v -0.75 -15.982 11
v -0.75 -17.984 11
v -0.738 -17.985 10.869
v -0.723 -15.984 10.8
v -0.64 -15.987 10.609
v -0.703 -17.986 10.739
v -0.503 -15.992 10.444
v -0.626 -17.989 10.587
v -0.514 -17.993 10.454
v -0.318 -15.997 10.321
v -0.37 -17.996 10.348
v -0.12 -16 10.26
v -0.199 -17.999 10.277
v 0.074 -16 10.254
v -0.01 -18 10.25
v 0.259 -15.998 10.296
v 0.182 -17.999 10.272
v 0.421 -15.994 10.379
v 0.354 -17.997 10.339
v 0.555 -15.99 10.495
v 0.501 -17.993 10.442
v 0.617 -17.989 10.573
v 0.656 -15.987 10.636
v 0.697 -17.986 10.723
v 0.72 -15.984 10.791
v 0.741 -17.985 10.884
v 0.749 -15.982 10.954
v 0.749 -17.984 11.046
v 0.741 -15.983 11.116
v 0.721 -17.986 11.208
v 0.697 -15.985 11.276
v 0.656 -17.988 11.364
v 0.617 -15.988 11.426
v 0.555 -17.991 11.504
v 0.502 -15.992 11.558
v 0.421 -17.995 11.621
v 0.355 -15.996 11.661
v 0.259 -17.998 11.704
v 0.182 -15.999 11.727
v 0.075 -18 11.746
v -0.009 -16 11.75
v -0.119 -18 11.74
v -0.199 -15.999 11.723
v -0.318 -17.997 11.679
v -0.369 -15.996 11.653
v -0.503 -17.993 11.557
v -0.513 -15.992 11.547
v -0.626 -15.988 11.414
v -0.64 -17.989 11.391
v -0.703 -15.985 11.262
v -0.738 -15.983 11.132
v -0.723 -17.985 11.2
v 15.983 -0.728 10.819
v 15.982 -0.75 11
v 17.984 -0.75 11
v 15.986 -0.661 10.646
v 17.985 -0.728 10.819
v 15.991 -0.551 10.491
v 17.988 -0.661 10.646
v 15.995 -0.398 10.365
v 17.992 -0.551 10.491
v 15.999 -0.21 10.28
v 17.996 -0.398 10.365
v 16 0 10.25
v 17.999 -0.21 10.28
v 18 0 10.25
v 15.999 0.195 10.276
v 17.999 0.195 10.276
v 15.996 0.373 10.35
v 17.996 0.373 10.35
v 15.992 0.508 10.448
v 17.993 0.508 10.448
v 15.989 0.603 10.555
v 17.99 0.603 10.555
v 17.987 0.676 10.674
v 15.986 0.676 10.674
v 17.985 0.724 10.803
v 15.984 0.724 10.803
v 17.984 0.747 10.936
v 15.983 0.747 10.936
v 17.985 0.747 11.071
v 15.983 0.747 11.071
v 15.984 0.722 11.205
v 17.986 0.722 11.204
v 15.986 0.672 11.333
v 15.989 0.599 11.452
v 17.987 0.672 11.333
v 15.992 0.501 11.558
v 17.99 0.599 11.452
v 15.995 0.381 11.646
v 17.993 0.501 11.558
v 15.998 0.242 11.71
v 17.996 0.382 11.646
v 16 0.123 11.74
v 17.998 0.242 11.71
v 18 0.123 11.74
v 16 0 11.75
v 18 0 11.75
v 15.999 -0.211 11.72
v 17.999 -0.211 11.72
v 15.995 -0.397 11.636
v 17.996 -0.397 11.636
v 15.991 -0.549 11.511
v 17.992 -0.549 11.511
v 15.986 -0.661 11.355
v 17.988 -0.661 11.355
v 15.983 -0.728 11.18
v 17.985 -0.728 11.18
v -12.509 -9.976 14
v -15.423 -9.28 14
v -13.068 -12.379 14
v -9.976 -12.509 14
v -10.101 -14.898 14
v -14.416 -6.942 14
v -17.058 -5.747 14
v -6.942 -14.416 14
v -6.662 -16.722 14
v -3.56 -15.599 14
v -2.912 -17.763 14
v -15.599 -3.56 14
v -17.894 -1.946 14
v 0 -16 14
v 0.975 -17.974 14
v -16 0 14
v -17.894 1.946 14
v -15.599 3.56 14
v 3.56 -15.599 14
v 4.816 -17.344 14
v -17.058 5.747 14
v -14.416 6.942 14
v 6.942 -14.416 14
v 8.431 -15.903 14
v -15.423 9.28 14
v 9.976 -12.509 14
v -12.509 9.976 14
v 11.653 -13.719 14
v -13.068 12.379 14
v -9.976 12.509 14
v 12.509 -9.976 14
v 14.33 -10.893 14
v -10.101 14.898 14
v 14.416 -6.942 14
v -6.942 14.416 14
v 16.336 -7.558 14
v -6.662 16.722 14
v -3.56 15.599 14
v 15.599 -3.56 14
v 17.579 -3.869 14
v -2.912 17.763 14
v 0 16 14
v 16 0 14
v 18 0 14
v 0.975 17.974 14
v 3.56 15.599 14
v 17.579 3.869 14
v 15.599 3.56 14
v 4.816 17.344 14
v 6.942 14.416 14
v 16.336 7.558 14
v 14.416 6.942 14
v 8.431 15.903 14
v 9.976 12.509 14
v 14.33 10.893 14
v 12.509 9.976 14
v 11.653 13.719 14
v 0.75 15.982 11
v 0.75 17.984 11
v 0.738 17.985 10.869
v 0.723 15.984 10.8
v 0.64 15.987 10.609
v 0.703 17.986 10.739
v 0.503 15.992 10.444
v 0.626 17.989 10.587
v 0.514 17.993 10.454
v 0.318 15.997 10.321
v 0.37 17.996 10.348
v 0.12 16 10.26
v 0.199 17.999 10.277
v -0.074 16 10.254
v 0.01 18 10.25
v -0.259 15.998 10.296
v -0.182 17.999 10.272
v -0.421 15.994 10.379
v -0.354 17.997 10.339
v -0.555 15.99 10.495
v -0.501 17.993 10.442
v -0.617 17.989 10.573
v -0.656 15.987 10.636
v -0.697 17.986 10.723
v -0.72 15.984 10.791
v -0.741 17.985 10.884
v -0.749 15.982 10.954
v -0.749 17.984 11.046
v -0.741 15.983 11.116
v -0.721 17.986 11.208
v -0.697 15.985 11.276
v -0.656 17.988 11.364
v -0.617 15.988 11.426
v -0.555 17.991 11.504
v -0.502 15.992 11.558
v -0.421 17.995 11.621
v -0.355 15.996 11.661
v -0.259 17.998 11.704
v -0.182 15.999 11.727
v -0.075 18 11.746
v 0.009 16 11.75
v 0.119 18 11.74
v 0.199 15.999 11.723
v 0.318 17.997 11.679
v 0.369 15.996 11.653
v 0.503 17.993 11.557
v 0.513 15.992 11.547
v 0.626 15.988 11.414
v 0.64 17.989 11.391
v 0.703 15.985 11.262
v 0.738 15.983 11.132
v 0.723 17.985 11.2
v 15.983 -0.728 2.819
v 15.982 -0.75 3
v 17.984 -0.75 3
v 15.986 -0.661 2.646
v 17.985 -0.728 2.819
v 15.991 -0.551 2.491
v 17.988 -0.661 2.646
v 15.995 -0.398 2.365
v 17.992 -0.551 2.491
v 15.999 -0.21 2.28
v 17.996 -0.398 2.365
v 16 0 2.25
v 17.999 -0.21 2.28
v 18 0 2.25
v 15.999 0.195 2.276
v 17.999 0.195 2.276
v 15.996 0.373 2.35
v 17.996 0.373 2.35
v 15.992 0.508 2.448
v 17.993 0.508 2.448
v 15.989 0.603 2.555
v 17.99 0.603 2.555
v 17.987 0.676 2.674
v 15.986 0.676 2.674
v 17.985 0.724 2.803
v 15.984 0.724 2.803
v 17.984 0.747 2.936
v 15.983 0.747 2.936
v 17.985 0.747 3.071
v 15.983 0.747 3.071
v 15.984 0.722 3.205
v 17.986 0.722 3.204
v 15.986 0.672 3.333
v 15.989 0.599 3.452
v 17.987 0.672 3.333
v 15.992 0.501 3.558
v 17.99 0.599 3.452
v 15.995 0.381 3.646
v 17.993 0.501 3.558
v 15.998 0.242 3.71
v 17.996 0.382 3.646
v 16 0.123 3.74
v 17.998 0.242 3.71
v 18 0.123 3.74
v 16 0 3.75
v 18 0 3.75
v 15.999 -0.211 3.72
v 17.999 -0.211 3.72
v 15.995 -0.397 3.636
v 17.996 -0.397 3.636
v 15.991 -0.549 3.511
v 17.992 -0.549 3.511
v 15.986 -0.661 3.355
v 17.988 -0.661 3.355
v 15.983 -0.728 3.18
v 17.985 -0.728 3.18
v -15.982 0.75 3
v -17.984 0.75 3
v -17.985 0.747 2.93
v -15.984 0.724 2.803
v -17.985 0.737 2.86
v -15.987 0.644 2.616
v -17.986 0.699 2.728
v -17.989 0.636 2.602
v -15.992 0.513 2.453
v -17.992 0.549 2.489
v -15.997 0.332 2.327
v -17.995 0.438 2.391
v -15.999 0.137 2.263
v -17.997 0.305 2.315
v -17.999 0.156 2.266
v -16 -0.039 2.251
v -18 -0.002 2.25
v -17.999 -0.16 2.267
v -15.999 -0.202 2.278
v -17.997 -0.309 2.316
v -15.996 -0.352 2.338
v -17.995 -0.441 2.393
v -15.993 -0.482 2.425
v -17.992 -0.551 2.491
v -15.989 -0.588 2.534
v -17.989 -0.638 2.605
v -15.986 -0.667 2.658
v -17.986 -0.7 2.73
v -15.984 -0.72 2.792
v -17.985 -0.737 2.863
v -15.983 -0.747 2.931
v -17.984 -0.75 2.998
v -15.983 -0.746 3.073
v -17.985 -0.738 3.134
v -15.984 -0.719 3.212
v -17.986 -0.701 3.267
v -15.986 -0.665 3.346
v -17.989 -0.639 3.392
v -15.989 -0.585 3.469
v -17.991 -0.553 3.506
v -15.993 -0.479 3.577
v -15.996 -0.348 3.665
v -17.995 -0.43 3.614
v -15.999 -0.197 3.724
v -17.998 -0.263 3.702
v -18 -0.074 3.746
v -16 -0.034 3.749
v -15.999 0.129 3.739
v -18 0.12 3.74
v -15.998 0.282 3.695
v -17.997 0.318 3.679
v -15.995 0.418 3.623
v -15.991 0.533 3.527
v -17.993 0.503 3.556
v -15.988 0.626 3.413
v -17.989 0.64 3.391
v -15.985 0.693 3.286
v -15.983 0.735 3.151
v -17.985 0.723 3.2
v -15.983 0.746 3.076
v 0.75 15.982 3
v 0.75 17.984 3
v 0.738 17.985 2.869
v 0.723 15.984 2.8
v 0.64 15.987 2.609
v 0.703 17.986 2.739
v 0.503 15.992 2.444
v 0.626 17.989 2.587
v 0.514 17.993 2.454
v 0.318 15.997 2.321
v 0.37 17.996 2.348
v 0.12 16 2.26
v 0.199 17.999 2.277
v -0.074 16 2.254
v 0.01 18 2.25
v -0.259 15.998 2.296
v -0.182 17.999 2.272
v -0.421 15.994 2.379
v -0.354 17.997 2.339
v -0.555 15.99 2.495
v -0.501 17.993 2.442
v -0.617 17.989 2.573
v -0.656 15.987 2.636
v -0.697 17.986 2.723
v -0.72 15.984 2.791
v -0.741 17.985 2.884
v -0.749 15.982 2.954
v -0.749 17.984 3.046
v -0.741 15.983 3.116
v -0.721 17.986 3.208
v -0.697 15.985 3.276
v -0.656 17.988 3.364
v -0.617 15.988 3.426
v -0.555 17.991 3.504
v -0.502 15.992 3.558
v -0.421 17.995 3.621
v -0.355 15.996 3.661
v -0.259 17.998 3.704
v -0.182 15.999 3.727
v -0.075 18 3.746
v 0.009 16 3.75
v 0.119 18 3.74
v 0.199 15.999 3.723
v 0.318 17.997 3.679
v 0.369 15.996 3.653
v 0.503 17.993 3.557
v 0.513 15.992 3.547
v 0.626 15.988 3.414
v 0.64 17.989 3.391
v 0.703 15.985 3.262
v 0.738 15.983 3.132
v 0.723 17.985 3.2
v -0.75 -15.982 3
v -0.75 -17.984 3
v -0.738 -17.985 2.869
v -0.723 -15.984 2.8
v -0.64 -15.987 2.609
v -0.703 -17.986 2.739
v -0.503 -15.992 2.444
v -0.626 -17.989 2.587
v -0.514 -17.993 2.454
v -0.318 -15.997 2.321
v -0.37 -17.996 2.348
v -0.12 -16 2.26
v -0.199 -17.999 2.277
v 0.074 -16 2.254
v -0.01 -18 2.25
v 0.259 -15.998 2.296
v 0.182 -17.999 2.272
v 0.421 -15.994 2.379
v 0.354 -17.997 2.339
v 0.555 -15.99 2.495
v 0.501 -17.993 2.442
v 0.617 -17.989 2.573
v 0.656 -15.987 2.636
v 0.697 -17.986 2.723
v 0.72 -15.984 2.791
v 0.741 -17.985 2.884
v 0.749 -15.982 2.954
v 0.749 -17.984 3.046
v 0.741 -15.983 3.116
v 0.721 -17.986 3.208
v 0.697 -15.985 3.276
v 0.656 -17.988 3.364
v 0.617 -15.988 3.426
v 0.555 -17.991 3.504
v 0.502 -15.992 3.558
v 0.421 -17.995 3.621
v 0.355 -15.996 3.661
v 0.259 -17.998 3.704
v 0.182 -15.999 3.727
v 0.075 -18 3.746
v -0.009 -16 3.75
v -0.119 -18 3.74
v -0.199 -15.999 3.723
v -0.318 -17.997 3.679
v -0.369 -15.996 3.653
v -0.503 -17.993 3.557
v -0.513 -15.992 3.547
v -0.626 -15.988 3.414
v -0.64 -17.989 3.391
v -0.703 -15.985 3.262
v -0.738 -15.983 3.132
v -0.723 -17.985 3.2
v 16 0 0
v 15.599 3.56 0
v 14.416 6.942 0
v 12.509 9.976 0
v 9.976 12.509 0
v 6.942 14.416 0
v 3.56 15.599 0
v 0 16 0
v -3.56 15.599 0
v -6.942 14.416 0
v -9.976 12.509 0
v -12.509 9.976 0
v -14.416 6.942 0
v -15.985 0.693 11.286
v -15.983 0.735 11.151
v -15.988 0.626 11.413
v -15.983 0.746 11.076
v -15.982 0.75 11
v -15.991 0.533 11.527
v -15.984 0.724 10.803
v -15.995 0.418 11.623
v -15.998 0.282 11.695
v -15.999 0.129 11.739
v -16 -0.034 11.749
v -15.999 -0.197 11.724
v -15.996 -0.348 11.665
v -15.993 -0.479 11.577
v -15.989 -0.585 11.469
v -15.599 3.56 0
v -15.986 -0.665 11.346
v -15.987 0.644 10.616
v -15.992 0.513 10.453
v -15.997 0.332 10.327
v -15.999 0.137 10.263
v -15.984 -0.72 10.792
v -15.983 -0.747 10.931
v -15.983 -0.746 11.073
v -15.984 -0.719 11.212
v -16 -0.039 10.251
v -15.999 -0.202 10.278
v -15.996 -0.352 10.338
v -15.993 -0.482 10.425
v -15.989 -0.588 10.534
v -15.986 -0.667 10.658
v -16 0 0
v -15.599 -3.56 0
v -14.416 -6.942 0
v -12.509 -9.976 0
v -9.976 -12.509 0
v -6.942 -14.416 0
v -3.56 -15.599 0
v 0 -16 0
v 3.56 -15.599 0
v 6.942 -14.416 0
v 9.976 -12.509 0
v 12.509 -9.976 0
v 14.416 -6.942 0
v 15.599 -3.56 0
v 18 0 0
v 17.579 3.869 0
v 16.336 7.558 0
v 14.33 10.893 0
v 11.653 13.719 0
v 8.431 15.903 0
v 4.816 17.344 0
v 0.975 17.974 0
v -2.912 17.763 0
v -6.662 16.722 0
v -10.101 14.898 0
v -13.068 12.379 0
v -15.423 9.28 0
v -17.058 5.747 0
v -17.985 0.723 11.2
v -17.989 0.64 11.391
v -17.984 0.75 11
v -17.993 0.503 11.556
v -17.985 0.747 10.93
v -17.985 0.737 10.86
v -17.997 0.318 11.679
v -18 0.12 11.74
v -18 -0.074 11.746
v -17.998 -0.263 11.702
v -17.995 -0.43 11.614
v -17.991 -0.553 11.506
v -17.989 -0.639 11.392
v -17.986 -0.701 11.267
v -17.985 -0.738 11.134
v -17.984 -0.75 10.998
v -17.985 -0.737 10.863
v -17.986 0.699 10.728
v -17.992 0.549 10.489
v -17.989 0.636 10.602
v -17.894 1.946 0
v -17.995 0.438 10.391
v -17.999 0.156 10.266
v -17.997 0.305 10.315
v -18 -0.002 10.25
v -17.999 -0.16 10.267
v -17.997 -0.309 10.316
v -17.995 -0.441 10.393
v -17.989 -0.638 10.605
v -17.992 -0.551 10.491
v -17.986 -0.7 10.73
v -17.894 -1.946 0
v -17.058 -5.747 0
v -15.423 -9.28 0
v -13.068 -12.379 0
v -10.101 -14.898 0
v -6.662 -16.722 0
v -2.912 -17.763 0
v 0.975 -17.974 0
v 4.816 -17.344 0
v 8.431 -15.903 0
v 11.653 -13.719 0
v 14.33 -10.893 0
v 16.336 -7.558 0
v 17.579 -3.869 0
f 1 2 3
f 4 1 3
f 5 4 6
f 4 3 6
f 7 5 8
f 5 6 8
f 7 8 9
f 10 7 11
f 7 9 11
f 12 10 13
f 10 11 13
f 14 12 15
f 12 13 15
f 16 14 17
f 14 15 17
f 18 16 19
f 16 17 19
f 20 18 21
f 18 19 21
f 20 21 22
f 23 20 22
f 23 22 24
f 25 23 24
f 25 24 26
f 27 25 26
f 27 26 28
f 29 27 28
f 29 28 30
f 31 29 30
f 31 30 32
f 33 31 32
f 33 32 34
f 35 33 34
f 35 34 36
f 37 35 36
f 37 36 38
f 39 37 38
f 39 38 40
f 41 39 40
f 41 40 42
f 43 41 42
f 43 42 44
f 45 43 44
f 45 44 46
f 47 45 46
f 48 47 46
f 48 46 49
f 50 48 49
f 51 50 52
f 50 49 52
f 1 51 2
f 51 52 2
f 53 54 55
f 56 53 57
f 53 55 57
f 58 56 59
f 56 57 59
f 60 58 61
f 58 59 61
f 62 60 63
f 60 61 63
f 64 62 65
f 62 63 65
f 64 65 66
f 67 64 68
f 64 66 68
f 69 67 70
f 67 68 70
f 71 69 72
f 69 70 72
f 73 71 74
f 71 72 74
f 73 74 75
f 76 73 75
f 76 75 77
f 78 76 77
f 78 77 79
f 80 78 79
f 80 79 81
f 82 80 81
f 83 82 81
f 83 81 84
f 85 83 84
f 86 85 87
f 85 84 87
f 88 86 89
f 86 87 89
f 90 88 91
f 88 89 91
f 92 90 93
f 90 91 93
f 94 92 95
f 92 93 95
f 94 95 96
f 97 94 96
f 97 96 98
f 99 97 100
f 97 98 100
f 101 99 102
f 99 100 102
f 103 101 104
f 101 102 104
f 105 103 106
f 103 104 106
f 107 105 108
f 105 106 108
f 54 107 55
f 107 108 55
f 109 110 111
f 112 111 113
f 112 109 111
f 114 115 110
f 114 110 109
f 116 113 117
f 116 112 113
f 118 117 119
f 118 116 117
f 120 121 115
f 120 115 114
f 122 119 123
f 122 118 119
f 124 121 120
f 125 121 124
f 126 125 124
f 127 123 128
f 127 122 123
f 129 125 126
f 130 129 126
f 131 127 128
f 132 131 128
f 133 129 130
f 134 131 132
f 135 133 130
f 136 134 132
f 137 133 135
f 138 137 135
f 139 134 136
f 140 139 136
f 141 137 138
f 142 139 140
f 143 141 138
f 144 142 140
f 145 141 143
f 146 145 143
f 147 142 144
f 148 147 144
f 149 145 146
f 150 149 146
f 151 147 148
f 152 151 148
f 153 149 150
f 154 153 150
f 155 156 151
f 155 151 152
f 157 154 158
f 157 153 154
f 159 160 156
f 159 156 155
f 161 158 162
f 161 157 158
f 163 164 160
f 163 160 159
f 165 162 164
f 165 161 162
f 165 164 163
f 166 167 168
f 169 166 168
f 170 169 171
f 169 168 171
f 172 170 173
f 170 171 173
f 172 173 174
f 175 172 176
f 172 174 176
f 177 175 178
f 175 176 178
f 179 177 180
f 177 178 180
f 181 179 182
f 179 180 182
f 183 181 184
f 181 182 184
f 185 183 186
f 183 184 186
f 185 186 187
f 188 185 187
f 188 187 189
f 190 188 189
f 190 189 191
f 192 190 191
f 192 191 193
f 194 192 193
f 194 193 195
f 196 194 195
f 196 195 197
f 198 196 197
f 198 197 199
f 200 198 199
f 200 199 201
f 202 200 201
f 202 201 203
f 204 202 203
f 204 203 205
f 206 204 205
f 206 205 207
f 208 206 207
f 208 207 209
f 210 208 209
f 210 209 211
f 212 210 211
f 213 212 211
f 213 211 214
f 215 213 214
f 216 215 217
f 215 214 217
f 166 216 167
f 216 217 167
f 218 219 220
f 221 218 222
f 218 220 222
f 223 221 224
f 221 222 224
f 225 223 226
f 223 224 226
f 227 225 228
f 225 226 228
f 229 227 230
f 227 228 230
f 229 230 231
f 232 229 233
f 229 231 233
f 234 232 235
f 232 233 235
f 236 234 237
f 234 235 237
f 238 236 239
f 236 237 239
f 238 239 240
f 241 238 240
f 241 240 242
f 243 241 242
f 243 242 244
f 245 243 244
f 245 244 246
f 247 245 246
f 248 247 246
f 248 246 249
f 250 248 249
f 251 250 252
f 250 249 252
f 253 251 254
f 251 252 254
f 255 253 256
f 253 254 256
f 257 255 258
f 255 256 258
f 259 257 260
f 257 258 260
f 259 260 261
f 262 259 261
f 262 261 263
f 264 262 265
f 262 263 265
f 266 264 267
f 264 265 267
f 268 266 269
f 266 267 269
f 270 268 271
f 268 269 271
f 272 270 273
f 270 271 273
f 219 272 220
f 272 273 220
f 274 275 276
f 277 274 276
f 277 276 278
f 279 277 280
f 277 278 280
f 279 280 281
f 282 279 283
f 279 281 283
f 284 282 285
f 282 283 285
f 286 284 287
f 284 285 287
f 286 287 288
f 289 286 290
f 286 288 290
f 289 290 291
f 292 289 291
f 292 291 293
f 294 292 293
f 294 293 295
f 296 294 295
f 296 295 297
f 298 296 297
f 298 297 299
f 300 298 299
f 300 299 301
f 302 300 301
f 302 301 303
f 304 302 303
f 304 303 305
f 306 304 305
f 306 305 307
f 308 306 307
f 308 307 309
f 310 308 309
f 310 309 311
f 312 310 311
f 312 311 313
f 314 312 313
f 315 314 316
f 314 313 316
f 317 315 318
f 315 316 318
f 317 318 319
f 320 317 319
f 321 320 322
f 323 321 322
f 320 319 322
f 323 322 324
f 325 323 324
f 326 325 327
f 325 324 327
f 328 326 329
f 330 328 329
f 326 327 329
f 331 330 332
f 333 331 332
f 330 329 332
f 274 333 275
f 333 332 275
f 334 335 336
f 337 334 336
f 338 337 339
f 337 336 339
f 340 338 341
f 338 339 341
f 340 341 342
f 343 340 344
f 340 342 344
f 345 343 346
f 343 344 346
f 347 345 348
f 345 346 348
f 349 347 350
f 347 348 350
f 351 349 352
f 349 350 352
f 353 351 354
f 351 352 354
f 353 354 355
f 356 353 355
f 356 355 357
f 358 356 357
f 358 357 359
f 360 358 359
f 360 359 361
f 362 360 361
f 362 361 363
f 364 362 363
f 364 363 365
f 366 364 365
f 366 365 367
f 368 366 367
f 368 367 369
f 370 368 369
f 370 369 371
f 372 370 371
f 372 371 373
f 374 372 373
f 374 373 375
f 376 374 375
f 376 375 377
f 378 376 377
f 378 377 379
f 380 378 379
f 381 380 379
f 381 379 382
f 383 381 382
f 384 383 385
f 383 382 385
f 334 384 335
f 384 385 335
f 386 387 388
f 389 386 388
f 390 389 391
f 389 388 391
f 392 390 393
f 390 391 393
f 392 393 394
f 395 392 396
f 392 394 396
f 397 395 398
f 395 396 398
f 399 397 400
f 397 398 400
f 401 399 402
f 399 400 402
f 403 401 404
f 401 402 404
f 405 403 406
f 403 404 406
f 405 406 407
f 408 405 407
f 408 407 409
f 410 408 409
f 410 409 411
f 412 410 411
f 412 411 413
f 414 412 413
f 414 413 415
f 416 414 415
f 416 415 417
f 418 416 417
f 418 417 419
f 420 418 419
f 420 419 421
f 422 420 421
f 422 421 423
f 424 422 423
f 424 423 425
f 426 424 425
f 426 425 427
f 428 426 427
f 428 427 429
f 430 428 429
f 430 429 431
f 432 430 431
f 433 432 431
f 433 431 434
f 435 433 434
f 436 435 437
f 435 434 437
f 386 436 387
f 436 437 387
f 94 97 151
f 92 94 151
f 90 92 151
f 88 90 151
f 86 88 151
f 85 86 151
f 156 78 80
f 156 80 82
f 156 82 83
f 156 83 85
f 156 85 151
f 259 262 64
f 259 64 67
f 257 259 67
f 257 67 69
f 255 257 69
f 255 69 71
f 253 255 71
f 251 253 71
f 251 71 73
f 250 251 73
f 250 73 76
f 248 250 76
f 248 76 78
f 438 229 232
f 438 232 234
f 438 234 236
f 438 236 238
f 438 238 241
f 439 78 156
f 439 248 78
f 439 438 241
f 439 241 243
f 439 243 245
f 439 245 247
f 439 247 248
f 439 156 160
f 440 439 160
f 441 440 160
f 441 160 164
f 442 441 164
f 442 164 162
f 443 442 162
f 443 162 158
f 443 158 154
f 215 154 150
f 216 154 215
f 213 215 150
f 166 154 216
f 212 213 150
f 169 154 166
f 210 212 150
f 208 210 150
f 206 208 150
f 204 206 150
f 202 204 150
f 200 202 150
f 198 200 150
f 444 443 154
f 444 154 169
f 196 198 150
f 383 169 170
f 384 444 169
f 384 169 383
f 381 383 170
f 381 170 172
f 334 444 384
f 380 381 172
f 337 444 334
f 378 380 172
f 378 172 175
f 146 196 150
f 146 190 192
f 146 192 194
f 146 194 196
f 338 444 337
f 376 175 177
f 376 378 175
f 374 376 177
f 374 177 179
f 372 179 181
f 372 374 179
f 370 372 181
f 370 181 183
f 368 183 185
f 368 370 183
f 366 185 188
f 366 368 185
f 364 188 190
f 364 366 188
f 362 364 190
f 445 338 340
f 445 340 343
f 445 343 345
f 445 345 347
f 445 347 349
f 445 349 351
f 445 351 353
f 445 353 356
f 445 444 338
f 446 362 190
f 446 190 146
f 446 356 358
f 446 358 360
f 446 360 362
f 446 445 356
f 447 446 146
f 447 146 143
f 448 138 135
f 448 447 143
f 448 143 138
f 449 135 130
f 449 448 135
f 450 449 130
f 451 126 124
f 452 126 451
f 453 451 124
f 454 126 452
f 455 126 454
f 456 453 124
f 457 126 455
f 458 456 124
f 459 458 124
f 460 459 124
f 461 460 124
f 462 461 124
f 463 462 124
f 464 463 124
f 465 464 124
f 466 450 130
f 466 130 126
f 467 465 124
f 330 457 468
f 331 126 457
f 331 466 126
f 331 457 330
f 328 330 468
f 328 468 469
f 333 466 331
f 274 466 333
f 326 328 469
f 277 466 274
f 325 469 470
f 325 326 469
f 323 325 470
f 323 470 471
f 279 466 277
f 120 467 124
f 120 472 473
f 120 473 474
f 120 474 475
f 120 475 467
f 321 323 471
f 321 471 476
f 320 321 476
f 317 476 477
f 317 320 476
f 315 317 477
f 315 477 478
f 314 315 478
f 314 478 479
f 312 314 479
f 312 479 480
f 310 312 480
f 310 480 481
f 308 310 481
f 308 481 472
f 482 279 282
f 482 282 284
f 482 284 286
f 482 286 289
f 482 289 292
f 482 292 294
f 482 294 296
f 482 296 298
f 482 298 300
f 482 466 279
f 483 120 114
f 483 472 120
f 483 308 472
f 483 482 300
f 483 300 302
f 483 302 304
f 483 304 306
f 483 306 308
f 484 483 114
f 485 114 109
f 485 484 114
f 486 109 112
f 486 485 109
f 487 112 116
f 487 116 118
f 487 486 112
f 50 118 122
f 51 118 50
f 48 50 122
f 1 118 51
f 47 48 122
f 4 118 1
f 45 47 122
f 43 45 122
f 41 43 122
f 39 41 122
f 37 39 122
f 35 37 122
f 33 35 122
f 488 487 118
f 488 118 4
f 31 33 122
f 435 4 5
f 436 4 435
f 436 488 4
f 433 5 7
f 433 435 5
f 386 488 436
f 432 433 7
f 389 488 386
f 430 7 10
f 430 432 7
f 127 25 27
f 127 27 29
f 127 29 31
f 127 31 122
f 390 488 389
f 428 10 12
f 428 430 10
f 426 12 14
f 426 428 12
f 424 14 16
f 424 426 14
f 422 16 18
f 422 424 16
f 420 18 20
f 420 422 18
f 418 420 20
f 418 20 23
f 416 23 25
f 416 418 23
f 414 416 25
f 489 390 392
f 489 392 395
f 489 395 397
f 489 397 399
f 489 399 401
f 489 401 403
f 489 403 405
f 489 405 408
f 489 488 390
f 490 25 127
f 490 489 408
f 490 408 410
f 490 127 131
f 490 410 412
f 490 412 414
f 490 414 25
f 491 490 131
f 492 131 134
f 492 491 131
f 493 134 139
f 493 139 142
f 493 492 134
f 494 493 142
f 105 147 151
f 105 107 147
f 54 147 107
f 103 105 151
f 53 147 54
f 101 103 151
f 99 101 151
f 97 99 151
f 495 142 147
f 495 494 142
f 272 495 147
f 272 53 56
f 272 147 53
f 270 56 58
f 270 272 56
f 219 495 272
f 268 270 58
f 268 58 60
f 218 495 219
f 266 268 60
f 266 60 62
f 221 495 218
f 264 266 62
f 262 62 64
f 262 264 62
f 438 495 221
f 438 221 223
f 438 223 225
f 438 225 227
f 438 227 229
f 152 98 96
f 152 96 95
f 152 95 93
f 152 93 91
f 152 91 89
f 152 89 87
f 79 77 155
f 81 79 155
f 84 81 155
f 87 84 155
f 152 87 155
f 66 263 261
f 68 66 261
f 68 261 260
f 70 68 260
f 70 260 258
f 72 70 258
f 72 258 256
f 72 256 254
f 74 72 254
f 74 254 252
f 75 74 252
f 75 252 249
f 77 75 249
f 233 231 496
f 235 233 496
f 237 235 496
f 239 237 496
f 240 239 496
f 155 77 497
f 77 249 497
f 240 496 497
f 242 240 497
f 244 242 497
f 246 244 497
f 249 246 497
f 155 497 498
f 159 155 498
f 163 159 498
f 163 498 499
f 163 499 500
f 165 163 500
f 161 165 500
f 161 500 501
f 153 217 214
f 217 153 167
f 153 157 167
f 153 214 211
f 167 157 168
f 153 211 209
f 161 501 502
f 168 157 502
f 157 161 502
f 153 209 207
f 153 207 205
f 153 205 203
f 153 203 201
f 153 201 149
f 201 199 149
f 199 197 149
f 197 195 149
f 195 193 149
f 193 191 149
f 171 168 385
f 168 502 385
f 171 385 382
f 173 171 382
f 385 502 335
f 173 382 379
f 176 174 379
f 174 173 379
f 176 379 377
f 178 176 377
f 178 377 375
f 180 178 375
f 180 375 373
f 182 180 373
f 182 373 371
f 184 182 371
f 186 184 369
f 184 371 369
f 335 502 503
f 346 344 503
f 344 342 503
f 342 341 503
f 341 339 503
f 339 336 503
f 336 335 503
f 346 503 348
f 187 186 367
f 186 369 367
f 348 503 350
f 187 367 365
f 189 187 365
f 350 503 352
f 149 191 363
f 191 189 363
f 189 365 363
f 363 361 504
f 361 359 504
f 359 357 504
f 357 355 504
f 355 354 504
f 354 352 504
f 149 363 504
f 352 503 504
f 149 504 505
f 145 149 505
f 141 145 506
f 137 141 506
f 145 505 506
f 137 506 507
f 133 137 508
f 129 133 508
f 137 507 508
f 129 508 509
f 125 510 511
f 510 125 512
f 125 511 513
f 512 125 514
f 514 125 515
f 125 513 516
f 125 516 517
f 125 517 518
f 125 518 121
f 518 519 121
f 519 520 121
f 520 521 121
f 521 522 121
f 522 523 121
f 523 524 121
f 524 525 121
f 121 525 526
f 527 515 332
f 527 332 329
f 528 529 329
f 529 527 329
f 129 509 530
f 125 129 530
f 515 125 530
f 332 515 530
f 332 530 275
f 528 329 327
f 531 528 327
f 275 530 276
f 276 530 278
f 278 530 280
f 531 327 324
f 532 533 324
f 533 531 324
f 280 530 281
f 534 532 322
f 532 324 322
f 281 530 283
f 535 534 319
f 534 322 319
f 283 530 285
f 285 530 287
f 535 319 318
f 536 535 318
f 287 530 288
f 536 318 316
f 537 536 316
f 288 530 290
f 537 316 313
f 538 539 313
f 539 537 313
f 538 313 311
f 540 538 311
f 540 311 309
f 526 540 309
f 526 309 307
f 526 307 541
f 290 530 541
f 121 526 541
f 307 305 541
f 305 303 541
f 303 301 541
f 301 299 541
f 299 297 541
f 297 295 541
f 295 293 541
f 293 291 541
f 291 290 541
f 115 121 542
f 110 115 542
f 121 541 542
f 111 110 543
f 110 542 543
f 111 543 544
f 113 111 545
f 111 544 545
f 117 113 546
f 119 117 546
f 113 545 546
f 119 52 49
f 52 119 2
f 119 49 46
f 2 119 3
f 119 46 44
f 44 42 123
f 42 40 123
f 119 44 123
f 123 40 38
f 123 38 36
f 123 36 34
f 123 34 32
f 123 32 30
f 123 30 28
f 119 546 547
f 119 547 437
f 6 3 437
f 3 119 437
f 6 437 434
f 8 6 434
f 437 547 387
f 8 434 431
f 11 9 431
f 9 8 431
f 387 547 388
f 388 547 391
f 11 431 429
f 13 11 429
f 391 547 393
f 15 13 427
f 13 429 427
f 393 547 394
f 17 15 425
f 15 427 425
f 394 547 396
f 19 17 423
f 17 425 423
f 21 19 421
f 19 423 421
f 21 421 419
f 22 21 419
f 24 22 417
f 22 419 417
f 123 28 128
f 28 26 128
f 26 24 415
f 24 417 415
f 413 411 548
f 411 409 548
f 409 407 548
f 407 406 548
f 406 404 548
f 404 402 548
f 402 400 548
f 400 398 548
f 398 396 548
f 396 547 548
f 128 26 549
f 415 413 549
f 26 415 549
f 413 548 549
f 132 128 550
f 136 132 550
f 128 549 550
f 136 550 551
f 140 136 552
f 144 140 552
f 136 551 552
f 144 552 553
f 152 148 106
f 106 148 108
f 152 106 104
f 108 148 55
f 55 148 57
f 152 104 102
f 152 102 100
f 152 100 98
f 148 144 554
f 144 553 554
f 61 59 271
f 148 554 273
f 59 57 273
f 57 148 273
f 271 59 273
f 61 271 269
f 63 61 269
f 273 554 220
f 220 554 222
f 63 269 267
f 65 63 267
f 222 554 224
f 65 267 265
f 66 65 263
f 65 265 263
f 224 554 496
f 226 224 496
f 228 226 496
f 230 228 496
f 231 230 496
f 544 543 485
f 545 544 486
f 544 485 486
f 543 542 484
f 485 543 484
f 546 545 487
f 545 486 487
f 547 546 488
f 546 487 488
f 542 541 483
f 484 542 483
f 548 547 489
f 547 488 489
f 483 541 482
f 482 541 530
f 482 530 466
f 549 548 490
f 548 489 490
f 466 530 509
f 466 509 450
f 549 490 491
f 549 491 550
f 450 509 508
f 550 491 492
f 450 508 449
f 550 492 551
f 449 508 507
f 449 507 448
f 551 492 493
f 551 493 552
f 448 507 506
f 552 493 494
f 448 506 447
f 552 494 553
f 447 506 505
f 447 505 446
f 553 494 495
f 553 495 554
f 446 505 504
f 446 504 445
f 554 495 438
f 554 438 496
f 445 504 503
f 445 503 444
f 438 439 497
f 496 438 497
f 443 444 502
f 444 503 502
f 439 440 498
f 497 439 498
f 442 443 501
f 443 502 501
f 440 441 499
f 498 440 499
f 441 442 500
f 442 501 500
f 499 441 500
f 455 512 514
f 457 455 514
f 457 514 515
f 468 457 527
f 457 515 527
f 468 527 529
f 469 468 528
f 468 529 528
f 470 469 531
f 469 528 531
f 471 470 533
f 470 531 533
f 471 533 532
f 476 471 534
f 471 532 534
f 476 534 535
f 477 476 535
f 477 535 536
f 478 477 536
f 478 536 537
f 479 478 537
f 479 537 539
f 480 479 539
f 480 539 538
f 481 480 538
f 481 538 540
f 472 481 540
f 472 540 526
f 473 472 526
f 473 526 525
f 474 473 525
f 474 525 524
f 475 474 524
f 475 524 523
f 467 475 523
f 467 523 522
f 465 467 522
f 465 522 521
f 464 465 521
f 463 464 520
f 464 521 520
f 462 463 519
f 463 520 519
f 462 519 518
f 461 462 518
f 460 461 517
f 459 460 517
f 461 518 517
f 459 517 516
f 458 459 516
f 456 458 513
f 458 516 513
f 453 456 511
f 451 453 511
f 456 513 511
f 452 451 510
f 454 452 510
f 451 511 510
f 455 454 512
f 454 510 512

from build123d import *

# Parameters (mm, degrees)
SKETCH1_R           = 18
SKETCH1_R_2         = 16
BOSS_EXTRUDE1_DEPTH = 14
SKETCH2_R           = 0.75
CUT_EXTRUDE1_DEPTH  = 5
CIRPATTERN1_COUNT   = 4


with BuildPart() as part:
    # Sketch1 → Boss-Extrude1 (new body)
    with BuildSketch(Plane.XY):
        Circle(SKETCH1_R)
        Circle(SKETCH1_R_2, mode=Mode.SUBTRACT)
    extrude(amount=BOSS_EXTRUDE1_DEPTH)

    # Sketch2 → Cut-Extrude1 (cut)
    with BuildSketch(Plane(origin=(0, 18, 0), x_dir=(1, 0, 0), z_dir=(0, 1, 0))):
        with Locations((0, -3)):
            Circle(SKETCH2_R)
        with Locations((0, -11)):
            Circle(SKETCH2_R)
    cut_extrude1 = extrude(amount=-CUT_EXTRUDE1_DEPTH, mode=Mode.SUBTRACT)

    # CirPattern1: Cut-Extrude1 ×4 about axis
    cirpattern1_axis = Axis((0, 0, 14), (0, 0, 1))
    for i in range(1, CIRPATTERN1_COUNT):
        add(cut_extrude1.rotate(cirpattern1_axis, i * 360 / CIRPATTERN1_COUNT), mode=Mode.SUBTRACT)


solid = part.part
